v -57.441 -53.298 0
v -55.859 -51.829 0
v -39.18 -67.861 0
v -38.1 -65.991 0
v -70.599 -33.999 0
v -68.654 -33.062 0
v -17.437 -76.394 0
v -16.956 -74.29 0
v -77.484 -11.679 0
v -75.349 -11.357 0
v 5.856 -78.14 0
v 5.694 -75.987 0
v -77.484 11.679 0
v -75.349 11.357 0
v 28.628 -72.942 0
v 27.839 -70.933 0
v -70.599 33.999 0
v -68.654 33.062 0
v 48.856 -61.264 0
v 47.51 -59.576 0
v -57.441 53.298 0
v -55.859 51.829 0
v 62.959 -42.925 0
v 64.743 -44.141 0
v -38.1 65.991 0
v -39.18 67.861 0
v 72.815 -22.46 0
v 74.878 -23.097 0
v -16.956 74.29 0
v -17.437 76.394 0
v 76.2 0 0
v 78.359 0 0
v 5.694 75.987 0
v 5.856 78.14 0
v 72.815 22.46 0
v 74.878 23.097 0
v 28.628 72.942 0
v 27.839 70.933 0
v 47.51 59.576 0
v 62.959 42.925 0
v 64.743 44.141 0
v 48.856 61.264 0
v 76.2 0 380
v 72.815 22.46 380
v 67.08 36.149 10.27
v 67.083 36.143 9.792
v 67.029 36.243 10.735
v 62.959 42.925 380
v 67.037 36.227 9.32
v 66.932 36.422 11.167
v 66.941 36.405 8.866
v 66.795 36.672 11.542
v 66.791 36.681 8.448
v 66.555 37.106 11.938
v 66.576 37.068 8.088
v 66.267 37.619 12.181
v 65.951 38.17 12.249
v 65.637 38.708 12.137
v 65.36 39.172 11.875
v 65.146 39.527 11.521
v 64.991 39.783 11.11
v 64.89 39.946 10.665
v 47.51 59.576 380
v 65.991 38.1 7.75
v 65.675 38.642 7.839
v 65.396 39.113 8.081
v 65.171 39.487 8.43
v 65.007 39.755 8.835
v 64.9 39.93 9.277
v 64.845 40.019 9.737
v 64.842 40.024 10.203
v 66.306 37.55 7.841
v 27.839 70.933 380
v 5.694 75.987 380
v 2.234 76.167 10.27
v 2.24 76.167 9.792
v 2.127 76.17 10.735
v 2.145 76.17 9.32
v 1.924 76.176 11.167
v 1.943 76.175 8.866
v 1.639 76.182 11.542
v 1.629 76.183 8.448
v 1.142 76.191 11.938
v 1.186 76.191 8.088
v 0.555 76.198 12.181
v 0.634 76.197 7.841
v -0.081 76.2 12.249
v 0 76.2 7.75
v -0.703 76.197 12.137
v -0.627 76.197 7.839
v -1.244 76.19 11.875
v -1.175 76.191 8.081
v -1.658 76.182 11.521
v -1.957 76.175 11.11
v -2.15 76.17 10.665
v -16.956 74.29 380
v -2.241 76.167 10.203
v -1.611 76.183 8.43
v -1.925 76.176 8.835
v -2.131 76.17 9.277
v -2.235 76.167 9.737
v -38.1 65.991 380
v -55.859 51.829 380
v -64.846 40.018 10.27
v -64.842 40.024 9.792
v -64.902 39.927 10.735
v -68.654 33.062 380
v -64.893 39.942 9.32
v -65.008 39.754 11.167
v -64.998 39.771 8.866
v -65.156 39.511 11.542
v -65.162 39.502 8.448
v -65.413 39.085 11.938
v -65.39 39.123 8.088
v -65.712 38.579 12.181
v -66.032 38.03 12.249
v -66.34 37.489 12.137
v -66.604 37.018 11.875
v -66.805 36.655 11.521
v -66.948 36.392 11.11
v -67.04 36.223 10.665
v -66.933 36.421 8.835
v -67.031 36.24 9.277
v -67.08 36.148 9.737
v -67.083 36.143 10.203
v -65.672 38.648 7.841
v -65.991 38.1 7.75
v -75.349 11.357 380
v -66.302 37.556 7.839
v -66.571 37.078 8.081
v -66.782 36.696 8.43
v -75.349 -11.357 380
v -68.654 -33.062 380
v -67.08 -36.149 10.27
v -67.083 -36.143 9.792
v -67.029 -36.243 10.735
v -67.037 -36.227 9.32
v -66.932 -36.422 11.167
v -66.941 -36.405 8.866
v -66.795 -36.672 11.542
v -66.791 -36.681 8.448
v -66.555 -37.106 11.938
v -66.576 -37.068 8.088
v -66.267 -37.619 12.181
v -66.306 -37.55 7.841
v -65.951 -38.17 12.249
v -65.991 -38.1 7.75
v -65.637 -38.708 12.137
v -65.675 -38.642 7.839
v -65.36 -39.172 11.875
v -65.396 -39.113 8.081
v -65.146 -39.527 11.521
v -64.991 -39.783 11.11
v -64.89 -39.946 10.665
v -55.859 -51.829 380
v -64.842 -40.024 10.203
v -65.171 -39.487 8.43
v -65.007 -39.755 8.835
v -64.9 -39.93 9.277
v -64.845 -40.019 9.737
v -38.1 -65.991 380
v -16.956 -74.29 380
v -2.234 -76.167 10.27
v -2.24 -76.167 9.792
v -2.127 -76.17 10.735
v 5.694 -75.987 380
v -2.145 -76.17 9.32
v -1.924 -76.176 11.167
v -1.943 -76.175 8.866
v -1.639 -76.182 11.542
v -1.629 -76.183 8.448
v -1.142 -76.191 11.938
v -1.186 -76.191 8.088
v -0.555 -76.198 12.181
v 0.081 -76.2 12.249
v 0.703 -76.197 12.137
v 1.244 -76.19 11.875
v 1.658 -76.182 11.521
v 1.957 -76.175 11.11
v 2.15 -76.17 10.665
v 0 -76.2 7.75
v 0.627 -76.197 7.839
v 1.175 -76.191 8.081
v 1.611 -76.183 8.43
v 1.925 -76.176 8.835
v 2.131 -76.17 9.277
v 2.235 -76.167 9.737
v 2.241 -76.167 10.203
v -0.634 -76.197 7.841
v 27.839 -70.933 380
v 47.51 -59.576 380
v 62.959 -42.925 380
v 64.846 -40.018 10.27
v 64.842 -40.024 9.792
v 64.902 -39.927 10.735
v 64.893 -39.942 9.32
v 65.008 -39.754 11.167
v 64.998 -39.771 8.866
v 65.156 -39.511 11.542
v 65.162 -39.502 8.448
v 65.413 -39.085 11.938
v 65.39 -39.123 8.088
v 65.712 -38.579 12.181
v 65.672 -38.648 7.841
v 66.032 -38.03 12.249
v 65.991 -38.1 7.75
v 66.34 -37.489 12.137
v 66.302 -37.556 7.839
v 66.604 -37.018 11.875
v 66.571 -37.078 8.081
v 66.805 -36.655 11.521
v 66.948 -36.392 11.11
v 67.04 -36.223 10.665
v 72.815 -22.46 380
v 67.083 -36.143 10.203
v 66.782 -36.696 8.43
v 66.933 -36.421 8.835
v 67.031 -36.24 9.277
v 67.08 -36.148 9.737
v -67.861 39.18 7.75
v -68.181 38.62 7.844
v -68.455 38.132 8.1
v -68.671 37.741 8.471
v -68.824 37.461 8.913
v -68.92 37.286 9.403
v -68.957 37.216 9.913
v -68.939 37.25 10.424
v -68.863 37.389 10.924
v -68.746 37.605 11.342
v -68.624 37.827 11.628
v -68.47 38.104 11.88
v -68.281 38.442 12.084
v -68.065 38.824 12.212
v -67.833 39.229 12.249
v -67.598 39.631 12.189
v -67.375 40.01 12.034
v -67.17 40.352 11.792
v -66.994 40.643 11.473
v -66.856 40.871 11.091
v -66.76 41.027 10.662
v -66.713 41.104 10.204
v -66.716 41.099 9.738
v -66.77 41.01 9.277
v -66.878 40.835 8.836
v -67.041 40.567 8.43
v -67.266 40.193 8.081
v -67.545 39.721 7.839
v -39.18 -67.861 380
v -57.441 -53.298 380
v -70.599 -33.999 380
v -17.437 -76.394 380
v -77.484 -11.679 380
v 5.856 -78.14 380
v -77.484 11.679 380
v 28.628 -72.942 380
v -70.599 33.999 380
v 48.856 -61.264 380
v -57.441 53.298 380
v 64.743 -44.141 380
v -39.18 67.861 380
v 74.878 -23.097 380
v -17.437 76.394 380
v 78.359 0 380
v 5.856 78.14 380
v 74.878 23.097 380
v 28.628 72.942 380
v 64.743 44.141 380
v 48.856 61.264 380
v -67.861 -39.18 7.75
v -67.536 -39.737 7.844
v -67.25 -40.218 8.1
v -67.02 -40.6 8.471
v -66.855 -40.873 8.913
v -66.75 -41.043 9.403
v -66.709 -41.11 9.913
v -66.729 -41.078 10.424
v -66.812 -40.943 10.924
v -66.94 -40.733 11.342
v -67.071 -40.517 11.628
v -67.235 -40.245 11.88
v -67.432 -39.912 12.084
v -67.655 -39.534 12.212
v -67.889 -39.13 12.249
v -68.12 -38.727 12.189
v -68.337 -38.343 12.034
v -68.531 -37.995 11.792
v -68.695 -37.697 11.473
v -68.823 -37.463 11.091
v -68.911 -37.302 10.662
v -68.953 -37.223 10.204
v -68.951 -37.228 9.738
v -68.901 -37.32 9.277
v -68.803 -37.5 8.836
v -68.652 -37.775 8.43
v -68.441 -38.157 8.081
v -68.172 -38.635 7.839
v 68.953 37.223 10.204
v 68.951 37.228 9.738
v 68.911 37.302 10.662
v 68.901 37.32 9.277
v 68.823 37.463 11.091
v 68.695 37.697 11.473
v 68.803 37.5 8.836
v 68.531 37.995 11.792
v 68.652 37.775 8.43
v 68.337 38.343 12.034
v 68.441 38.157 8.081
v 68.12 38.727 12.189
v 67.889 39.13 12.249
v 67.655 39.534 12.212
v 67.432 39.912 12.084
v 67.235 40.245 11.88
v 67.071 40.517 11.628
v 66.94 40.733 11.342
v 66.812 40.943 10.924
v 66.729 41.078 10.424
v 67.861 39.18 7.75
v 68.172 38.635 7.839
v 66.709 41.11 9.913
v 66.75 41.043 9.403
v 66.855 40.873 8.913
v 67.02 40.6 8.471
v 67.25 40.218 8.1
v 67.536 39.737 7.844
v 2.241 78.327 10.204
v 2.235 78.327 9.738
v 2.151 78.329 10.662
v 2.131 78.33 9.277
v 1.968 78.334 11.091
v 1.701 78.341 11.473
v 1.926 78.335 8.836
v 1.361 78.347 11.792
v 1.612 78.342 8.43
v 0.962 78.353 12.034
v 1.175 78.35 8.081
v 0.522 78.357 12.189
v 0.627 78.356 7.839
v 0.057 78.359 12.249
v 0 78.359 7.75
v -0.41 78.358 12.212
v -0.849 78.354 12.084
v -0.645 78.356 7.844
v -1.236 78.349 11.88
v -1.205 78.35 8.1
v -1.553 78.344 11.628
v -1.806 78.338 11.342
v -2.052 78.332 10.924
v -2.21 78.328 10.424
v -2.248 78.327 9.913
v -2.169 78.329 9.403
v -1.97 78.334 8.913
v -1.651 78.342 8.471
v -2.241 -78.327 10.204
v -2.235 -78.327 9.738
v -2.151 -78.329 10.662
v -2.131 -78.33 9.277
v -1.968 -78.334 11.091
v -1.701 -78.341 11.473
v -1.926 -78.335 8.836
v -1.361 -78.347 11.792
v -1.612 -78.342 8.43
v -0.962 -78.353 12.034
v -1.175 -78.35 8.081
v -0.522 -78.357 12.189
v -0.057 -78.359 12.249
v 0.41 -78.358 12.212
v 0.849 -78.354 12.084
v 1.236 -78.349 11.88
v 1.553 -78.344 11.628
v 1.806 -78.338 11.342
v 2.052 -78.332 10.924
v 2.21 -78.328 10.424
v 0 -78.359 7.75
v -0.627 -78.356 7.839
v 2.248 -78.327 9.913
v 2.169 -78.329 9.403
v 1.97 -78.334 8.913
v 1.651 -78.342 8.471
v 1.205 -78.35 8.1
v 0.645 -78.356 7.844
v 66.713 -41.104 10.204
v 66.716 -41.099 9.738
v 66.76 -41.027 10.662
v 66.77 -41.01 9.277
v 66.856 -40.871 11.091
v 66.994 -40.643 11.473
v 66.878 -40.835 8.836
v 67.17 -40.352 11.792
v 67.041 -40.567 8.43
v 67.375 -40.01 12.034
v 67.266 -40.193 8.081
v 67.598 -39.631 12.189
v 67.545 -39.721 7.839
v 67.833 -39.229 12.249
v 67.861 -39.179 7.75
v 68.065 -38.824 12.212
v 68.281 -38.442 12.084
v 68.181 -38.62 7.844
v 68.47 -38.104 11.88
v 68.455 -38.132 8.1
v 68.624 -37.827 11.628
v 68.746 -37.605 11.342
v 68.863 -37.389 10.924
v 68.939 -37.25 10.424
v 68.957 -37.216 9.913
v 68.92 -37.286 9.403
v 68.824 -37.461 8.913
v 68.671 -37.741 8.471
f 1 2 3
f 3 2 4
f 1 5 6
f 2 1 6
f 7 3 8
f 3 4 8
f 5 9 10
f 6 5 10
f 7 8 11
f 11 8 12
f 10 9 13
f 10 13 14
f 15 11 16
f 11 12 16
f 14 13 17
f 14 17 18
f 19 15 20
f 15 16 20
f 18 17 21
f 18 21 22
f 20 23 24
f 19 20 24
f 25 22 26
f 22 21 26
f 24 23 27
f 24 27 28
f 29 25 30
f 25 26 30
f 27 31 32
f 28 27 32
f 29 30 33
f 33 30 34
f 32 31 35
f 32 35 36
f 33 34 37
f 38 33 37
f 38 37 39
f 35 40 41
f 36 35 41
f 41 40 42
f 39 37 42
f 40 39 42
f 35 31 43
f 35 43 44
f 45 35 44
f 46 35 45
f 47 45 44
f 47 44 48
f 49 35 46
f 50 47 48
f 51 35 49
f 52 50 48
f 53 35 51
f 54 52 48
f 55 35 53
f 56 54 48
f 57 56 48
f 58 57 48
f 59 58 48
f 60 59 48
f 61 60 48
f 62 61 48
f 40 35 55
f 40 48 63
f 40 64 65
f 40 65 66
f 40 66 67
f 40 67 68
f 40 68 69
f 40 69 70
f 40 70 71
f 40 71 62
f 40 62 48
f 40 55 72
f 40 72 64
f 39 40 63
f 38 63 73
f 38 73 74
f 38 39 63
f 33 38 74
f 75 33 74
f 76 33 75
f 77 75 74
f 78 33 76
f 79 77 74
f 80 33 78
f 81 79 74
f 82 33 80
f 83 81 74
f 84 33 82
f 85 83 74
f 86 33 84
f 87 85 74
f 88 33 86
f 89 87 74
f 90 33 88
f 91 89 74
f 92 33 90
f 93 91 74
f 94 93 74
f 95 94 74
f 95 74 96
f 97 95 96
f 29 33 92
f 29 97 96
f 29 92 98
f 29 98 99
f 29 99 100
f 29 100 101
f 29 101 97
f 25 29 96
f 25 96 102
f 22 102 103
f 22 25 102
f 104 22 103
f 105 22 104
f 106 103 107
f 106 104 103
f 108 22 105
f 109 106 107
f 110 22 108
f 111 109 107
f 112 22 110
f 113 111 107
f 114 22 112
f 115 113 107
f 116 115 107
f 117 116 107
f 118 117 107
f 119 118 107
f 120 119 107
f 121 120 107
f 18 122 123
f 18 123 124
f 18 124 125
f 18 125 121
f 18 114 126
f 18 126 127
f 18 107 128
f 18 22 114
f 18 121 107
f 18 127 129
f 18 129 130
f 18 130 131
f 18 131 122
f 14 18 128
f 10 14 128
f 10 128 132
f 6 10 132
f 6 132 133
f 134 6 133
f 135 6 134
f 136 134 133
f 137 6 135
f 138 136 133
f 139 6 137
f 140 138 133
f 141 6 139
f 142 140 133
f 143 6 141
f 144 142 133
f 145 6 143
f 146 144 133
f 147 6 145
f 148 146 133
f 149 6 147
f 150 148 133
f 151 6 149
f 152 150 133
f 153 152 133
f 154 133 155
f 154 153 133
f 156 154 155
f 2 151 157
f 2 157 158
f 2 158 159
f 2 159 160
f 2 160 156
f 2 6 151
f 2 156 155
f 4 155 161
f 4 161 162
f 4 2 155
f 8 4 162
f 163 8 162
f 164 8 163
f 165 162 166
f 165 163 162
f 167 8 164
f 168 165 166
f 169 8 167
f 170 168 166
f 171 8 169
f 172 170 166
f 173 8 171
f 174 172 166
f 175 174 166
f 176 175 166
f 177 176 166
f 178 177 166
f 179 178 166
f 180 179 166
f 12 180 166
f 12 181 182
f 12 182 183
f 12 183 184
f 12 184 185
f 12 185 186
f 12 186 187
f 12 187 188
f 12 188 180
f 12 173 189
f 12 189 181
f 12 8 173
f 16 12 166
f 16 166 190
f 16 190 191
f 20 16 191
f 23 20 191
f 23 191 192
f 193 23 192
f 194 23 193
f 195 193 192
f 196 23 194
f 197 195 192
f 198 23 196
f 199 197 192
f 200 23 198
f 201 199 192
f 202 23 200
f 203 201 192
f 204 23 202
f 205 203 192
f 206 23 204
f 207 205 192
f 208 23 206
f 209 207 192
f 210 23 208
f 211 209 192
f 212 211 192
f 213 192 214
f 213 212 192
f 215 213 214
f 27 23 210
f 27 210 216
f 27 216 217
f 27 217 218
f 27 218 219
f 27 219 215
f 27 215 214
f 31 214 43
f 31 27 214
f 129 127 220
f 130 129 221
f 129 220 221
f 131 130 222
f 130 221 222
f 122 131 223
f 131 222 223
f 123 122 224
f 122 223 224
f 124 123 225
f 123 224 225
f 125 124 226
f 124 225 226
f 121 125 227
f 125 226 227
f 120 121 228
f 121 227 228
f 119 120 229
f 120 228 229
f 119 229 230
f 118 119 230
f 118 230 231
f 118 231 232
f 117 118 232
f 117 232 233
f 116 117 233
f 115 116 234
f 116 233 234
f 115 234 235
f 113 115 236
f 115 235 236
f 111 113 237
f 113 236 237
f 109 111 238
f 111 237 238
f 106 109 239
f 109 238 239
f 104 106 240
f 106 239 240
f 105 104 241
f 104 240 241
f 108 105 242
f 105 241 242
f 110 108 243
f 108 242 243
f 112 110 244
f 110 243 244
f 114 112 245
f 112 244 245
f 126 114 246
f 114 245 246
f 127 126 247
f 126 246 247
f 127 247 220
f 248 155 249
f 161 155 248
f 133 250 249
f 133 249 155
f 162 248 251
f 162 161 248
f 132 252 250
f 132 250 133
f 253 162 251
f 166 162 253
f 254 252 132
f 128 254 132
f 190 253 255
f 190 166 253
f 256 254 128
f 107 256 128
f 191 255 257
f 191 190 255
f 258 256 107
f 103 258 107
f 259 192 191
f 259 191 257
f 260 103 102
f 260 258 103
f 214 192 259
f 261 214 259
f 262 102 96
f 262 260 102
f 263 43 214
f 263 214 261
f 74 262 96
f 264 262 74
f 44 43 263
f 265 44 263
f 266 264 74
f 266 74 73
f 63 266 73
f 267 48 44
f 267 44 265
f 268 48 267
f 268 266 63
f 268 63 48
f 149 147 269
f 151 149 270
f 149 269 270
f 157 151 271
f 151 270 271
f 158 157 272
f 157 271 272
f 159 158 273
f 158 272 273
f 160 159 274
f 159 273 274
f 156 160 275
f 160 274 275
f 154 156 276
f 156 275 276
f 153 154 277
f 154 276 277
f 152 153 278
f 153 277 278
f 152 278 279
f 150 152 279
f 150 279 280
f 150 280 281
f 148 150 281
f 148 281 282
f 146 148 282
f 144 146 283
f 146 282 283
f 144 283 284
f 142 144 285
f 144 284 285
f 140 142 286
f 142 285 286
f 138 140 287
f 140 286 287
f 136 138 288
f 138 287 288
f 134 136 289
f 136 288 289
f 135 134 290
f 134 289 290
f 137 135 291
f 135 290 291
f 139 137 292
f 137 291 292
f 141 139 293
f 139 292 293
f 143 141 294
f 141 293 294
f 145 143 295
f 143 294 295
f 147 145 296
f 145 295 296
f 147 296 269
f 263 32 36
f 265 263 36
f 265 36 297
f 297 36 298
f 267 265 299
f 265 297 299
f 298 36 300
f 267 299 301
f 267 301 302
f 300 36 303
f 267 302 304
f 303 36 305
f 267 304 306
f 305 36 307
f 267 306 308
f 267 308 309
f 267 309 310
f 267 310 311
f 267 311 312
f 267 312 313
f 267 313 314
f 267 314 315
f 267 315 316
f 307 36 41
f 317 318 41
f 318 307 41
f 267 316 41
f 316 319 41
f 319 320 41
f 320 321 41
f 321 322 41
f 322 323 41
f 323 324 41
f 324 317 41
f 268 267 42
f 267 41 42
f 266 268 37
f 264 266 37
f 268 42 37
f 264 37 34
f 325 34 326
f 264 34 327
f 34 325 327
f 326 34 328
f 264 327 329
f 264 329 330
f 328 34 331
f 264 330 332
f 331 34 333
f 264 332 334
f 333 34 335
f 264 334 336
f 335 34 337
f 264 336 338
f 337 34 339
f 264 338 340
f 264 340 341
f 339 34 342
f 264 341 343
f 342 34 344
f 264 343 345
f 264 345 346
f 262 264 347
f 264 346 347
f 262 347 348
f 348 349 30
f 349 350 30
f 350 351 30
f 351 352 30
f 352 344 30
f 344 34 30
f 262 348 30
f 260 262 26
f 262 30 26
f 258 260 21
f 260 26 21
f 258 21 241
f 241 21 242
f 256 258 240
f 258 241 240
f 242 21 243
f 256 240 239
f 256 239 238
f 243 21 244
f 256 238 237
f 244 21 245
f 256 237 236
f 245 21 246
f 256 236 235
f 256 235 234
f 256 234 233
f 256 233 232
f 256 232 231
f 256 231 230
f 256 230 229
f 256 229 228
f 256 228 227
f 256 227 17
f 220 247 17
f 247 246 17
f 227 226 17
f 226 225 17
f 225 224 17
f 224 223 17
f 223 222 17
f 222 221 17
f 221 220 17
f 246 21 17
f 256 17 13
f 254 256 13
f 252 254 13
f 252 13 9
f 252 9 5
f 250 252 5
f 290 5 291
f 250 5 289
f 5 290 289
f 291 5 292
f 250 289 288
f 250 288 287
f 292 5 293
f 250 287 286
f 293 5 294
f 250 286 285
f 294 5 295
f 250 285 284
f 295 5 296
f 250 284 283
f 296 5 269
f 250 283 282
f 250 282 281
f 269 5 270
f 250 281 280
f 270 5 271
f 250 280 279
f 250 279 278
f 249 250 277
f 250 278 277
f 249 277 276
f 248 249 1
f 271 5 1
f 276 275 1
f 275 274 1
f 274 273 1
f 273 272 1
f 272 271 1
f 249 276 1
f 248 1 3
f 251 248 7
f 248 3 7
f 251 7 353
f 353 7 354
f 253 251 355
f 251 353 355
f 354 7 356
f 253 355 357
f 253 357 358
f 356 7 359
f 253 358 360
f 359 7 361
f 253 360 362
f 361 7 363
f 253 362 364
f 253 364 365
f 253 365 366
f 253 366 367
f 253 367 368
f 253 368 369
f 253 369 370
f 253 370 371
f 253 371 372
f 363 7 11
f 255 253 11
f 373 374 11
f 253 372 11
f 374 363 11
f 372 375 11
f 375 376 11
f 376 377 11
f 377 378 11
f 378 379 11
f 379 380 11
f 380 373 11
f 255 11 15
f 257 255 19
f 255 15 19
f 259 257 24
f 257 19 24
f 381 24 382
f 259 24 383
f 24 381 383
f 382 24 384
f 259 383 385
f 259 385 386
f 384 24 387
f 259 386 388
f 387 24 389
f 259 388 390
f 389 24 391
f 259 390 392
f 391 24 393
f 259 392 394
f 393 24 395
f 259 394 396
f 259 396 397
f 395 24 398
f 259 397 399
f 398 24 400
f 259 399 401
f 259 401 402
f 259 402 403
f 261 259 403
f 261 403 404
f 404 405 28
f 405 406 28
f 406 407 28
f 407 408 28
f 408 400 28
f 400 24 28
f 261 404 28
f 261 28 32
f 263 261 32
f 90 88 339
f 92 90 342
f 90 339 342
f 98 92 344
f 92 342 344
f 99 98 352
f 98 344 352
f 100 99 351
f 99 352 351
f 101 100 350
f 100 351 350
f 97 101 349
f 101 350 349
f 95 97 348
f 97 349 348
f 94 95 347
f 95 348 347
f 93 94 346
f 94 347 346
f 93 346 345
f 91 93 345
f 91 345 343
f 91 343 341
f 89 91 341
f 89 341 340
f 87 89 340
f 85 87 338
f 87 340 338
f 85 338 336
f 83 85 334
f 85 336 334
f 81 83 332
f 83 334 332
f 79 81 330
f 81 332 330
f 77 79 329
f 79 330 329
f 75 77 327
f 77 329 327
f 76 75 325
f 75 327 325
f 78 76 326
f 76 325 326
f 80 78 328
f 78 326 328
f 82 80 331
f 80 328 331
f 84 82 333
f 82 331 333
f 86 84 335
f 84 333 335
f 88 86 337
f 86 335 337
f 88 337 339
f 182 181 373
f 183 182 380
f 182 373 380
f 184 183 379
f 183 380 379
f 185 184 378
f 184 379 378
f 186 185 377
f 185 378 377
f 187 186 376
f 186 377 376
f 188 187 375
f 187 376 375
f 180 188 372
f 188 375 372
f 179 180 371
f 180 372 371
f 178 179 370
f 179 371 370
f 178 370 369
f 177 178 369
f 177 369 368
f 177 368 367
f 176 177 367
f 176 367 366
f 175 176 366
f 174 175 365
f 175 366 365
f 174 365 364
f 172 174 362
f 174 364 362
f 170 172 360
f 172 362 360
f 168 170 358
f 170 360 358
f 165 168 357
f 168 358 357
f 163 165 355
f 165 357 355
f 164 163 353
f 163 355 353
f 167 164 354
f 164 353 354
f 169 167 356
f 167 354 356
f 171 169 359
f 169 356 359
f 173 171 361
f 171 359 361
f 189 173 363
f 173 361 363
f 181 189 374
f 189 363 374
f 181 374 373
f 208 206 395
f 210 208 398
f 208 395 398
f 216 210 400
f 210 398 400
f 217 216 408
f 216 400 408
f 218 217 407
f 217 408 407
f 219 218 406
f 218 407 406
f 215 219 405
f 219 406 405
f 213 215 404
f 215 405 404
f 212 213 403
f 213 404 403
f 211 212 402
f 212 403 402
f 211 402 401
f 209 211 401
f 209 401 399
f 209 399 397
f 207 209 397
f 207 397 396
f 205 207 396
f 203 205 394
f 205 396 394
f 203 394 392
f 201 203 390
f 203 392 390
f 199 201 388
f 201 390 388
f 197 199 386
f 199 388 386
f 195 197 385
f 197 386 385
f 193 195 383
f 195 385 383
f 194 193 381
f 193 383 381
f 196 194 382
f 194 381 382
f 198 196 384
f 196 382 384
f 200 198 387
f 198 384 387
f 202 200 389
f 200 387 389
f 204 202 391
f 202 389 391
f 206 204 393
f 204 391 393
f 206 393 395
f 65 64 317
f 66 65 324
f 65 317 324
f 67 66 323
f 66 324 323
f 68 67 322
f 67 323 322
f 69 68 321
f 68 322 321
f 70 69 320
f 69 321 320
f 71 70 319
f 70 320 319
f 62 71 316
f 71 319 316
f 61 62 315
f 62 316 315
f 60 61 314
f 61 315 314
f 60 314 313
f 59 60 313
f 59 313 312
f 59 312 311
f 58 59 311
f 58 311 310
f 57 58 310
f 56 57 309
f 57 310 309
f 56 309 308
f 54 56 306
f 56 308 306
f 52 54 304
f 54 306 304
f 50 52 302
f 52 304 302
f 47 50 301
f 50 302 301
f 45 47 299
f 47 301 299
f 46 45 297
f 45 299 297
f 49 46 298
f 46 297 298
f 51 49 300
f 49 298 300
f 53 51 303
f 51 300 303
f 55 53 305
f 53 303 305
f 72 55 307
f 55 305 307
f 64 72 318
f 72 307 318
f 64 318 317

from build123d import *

# Parameters (mm, degrees)
SKETCH1_R           = 78.359
SKETCH1_R_2         = 76.2
BOSS_EXTRUDE1_DEPTH = 380
SKETCH5_W           = 2.25
SKETCH5_H           = 78.359
CIRPATTERN2_COUNT   = 6


with BuildPart() as part:
    # Sketch1 → Boss-Extrude1 (new body)
    with BuildSketch(Plane.XY):
        Circle(SKETCH1_R)
        Circle(SKETCH1_R_2, mode=Mode.SUBTRACT)
    extrude(amount=BOSS_EXTRUDE1_DEPTH)

    # Sketch5 → M4 Clearance Hole2 (revolve, cut)
    with BuildSketch(Plane(origin=(0, 0, 10), x_dir=(0, 0, -1), z_dir=(1, 0, 0))):
        with Locations((1.125, 39.1795)):
            Rectangle(SKETCH5_W, SKETCH5_H)
    m4_clearance_hole2 = revolve(axis=Axis((0, -6.35, 10), (0, 1, 0)), mode=Mode.SUBTRACT)

    # CirPattern2: M4 Clearance Hole2 ×6 about axis
    cirpattern2_axis = Axis((0, 0, 380), (0, 0, -1))
    for i in range(1, CIRPATTERN2_COUNT):
        add(m4_clearance_hole2.rotate(cirpattern2_axis, i * 360 / CIRPATTERN2_COUNT), mode=Mode.SUBTRACT)


solid = part.part
